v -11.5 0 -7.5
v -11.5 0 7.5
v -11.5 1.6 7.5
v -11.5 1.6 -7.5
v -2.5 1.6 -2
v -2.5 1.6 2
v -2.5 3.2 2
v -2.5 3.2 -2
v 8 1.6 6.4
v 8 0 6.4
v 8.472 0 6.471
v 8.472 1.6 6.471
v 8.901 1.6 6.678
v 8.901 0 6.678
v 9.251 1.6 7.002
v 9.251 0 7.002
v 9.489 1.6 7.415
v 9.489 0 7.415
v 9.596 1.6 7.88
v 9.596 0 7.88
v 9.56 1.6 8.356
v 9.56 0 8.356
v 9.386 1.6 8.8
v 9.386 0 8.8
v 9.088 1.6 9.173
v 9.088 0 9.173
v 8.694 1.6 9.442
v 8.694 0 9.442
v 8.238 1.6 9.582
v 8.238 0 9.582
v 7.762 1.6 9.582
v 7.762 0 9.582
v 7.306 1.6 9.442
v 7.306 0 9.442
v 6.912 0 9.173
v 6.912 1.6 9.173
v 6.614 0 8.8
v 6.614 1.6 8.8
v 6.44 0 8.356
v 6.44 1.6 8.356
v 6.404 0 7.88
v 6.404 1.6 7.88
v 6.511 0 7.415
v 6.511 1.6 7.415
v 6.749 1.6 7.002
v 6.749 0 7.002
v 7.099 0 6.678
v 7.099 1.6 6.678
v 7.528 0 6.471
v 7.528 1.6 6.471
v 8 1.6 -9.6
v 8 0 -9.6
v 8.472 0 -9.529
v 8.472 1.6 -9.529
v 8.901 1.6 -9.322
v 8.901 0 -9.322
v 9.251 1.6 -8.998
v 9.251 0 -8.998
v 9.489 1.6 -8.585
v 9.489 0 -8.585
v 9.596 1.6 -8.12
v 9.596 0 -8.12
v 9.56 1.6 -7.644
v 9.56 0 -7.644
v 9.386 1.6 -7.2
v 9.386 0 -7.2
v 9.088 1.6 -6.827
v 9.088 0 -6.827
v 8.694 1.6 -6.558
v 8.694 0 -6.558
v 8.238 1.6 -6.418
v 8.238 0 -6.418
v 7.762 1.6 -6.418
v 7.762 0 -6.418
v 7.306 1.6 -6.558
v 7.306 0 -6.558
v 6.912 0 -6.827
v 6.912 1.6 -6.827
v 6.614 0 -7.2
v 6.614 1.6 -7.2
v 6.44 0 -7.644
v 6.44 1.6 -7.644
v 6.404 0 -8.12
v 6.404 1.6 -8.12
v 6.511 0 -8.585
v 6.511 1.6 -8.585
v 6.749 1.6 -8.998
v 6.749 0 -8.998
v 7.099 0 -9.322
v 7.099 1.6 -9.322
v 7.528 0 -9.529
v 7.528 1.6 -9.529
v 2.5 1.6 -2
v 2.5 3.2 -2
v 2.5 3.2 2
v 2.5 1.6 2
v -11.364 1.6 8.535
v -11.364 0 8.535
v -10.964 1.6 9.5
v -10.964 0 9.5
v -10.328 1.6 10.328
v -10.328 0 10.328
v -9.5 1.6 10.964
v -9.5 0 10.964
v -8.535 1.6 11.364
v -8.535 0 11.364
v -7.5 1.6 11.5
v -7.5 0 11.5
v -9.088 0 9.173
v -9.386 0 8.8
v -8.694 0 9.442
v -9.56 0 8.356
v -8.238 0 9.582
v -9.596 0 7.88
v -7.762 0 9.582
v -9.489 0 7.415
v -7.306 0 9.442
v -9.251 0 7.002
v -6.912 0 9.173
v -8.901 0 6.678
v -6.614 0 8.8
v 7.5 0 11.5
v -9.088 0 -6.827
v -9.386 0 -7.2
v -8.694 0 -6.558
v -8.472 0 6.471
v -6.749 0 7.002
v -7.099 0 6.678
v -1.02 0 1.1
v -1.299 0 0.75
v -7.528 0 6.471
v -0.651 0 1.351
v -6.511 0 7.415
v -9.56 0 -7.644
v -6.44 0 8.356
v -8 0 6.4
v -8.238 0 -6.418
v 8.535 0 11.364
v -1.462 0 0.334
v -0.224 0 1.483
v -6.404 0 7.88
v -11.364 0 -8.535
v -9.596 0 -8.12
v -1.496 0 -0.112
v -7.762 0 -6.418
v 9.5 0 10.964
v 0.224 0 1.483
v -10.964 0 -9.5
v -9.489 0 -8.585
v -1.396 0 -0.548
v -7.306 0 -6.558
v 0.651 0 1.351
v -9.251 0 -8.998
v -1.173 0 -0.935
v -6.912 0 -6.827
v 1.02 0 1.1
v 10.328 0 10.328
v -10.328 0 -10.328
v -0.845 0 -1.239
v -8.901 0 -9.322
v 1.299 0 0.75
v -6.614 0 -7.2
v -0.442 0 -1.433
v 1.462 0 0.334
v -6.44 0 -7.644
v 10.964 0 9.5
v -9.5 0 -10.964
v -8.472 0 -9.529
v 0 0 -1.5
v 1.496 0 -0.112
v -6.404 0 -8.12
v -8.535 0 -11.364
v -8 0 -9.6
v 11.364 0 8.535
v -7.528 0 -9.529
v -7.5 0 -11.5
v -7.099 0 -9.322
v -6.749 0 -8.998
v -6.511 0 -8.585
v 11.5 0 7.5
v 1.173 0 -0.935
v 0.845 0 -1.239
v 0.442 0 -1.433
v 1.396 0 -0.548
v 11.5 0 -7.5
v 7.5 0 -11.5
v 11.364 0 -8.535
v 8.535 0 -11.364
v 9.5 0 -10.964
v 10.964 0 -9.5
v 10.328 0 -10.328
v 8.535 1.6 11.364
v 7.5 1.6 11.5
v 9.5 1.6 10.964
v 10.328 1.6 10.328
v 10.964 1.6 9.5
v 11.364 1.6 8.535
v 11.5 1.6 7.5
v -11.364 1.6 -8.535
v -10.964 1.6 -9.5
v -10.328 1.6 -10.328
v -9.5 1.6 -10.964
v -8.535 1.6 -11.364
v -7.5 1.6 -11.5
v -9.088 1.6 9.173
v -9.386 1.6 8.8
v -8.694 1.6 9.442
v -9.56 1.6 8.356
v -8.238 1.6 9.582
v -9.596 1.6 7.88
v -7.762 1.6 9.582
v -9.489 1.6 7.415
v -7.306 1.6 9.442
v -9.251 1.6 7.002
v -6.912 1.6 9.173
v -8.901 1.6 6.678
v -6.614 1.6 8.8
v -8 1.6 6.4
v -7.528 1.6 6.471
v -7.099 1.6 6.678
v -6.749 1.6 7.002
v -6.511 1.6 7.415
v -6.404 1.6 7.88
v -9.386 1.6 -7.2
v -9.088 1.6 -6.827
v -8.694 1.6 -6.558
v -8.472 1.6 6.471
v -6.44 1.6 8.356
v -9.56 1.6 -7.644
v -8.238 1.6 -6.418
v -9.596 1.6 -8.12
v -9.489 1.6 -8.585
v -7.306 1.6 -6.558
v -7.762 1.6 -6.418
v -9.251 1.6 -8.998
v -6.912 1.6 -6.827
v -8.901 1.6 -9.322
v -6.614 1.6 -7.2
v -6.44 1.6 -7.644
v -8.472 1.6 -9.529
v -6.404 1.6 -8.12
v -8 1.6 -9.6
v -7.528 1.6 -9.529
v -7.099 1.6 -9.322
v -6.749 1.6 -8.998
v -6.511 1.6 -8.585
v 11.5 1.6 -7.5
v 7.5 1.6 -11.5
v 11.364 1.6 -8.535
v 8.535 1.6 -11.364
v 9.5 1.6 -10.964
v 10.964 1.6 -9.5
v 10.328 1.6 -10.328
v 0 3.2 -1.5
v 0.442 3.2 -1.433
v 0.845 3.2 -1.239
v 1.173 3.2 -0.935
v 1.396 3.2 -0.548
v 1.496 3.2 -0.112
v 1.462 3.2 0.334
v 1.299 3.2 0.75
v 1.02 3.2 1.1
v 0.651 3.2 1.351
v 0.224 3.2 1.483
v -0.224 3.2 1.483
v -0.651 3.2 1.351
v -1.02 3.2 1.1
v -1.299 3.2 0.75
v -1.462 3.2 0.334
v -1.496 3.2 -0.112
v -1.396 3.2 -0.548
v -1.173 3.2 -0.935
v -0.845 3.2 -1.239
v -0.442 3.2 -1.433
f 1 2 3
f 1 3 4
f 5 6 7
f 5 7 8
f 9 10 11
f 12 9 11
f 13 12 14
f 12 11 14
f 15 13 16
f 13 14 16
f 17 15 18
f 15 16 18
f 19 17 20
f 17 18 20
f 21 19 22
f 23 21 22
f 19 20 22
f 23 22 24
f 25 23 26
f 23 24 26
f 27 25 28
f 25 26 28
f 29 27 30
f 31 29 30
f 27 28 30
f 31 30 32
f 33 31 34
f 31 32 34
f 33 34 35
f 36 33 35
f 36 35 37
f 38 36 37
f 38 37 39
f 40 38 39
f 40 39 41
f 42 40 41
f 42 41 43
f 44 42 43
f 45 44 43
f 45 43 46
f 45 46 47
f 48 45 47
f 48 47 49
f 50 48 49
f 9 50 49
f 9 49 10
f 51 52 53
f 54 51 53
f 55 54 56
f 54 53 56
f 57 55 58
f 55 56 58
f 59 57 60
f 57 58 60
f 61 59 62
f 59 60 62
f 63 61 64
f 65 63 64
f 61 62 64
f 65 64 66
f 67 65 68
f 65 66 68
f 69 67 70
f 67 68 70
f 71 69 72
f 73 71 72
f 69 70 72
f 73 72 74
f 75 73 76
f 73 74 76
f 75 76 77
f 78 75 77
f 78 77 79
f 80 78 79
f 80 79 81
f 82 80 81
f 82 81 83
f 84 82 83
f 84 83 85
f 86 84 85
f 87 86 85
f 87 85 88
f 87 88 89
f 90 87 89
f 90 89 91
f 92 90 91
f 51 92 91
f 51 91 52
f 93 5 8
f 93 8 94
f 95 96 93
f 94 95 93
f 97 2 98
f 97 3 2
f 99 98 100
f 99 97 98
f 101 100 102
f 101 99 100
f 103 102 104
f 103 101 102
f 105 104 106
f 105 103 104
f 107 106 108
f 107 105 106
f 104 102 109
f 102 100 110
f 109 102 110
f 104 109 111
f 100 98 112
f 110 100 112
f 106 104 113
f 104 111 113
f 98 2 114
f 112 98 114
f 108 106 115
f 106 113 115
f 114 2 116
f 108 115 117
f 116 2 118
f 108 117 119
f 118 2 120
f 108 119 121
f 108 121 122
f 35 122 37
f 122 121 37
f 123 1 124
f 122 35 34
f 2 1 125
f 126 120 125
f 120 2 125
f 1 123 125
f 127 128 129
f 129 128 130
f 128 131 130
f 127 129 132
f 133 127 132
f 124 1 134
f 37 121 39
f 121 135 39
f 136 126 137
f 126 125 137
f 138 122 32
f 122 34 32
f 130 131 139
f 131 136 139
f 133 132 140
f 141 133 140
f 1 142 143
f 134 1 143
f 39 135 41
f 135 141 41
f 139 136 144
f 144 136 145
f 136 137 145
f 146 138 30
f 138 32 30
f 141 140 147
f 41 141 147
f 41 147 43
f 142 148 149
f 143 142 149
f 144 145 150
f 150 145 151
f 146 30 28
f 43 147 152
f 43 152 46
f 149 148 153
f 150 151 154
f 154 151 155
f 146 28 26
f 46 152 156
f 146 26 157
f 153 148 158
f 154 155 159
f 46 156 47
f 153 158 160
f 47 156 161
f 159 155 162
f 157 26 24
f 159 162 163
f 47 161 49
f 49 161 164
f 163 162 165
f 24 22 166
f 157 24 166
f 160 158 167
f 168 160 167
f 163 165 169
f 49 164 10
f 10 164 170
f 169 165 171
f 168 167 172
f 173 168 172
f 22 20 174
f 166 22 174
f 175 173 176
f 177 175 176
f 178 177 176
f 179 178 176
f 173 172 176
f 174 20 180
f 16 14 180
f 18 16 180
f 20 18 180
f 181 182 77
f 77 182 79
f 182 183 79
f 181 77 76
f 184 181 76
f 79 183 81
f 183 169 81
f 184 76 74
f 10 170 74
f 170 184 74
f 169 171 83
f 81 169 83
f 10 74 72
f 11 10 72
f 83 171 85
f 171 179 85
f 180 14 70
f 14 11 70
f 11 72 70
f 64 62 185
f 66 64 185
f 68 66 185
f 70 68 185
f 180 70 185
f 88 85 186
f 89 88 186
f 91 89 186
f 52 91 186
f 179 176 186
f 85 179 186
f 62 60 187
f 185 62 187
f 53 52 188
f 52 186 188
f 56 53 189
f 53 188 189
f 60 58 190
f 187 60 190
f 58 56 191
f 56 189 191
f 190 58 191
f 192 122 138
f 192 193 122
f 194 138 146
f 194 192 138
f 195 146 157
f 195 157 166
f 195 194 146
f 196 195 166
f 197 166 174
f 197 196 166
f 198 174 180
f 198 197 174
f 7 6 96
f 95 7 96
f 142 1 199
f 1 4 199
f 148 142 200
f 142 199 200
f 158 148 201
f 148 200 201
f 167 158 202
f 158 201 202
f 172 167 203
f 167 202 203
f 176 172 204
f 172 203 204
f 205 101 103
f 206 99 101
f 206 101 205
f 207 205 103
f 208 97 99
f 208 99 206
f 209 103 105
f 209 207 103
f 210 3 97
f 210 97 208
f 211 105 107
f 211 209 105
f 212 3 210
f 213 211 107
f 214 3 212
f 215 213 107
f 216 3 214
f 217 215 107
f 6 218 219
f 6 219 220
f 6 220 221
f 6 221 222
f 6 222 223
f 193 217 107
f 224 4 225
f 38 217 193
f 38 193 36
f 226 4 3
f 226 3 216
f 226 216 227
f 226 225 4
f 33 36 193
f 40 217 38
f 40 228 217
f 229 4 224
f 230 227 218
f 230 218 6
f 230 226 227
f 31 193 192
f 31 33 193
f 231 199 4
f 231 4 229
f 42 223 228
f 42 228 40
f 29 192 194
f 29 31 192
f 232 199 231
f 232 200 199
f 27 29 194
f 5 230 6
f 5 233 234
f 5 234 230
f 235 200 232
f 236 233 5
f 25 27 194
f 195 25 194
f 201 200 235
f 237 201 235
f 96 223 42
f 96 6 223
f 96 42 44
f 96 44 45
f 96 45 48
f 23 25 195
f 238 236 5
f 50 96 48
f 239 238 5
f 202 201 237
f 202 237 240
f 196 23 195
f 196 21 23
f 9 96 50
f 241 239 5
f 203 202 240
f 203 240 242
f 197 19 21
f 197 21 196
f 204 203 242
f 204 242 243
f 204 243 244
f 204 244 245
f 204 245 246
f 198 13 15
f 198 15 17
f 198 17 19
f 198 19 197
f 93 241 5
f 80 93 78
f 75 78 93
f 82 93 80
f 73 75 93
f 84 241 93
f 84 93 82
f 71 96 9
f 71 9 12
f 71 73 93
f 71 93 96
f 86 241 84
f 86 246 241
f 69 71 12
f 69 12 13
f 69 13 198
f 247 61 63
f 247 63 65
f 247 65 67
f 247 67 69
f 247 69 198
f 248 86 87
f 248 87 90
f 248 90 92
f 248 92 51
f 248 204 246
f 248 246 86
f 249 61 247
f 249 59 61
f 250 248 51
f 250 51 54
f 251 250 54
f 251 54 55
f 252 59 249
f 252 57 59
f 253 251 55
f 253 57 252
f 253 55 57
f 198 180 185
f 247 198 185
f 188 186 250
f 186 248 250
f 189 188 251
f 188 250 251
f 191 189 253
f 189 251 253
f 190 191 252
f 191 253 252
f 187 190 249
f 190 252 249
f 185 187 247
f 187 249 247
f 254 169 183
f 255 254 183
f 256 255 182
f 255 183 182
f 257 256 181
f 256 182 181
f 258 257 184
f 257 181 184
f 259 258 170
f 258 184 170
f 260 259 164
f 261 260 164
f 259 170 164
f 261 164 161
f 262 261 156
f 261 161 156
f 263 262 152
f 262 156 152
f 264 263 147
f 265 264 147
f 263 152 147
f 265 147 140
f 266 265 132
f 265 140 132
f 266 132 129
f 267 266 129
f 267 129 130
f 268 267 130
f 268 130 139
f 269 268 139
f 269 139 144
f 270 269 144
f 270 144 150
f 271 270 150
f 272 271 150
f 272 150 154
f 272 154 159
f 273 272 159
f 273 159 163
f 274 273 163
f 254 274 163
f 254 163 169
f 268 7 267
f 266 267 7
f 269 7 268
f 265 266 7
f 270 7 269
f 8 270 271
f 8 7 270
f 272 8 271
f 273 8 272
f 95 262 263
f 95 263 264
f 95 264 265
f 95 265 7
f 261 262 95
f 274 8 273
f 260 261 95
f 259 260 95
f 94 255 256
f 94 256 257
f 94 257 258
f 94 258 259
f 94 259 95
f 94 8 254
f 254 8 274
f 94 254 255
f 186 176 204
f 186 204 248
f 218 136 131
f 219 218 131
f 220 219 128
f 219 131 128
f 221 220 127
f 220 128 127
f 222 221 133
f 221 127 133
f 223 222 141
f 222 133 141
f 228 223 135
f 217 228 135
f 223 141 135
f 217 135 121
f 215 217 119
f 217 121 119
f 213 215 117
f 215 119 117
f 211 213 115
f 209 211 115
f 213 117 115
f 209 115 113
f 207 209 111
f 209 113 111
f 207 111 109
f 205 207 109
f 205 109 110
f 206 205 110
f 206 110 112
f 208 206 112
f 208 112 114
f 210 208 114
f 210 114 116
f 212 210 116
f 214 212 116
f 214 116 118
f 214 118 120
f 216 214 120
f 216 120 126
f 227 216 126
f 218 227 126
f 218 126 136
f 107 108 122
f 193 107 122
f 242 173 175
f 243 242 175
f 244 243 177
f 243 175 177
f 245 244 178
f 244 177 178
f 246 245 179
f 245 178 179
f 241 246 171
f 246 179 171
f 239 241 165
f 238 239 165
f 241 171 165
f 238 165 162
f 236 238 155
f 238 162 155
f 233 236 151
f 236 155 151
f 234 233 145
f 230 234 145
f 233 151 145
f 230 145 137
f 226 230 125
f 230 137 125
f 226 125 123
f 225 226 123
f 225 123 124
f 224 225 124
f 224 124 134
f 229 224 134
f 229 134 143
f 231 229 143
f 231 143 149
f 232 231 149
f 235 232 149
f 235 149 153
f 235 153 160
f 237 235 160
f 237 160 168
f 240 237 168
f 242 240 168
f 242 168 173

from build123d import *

# Parameters (mm, degrees)
SKETCH_1_W          = 23
SKETCH_1_H          = 23
EXTRUDE_1_DEPTH     = 1.6
SKETCH_2_W          = 5
SKETCH_2_H          = 4
EXTRUDE_2_DEPTH     = 1.6
FILLET_1_R          = 4
CUT_EXTRUDE_1_REACH = 18.575
SKETCH_3_R          = 1.6
CUT_EXTRUDE_2_REACH = 18.575
SKETCH_4_R          = 1.5


with BuildPart() as part:
    # 草图1 → 凸台-拉伸1 (new body)
    with BuildSketch(Plane(origin=(0, 0, 0), x_dir=(1, 0, 0), z_dir=(0, 1, 0))):
        Rectangle(SKETCH_1_W, SKETCH_1_H)
    extrude(amount=EXTRUDE_1_DEPTH)

    # 草图2 → 凸台-拉伸2 (add)
    with BuildSketch(Plane(origin=(0, 1.6, 0), x_dir=(1, 0, 0), z_dir=(0, 1, 0))):
        Rectangle(SKETCH_2_W, SKETCH_2_H)
    extrude(amount=EXTRUDE_2_DEPTH)

    # 圆角1
    fillet_1_edges = [part.edges().sort_by_distance(p)[0] for p in [
        (11.5, 0.8, 11.5),
        (-11.5, 0.8, 11.5),
        (-11.5, 0.8, -11.5),
        (11.5, 0.8, -11.5),
    ]]
    fillet(fillet_1_edges, radius=FILLET_1_R)

    # 草图3 → 切除-拉伸1 (cut, up to next)
    with BuildSketch(Plane.XZ, mode=Mode.PRIVATE) as cut_extrude_1_sk1:
        with Locations(Location((-8, 8, 0), (0, 0, 270))):
            Circle(SKETCH_3_R)
    cut_extrude_1_tool1 = extrude(cut_extrude_1_sk1.sketch, amount=-CUT_EXTRUDE_1_REACH, mode=Mode.PRIVATE) & part.part
    # 草图3 → 切除-拉伸1 (cut, up to next)
    with BuildSketch(Plane.XZ, mode=Mode.PRIVATE) as cut_extrude_1_sk2:
        with Locations(Location((8, 8, 0), (0, 0, 270))):
            Circle(SKETCH_3_R)
    cut_extrude_1_tool2 = extrude(cut_extrude_1_sk2.sketch, amount=-CUT_EXTRUDE_1_REACH, mode=Mode.PRIVATE) & part.part
    # 草图3 → 切除-拉伸1 (cut, up to next)
    with BuildSketch(Plane.XZ, mode=Mode.PRIVATE) as cut_extrude_1_sk3:
        with Locations(Location((8, -8, 0), (0, 0, 270))):
            Circle(SKETCH_3_R)
    cut_extrude_1_tool3 = extrude(cut_extrude_1_sk3.sketch, amount=-CUT_EXTRUDE_1_REACH, mode=Mode.PRIVATE) & part.part
    # 草图3 → 切除-拉伸1 (cut, up to next)
    with BuildSketch(Plane.XZ, mode=Mode.PRIVATE) as cut_extrude_1_sk4:
        with Locations(Location((-8, -8, 0), (0, 0, 270))):
            Circle(SKETCH_3_R)
    cut_extrude_1_tool4 = extrude(cut_extrude_1_sk4.sketch, amount=-CUT_EXTRUDE_1_REACH, mode=Mode.PRIVATE) & part.part
    add(cut_extrude_1_tool1.solids().sort_by_distance((-8, 0, 8))[0], mode=Mode.SUBTRACT)
    add(cut_extrude_1_tool2.solids().sort_by_distance((8, 0, 8))[0], mode=Mode.SUBTRACT)
    add(cut_extrude_1_tool3.solids().sort_by_distance((8, 0, -8))[0], mode=Mode.SUBTRACT)
    add(cut_extrude_1_tool4.solids().sort_by_distance((-8, 0, -8))[0], mode=Mode.SUBTRACT)

    # 草图4 → 切除-拉伸2 (cut, up to next)
    with BuildSketch(Plane.XZ, mode=Mode.PRIVATE) as cut_extrude_2_sk1:
        with Locations(Location((0, 0, 0), (0, 0, 270))):
            Circle(SKETCH_4_R)
    cut_extrude_2_tool1 = extrude(cut_extrude_2_sk1.sketch, amount=-CUT_EXTRUDE_2_REACH, mode=Mode.PRIVATE) & part.part
    add(cut_extrude_2_tool1.solids().sort_by_distance((0, 0, 0))[0], mode=Mode.SUBTRACT)


solid = part.part
